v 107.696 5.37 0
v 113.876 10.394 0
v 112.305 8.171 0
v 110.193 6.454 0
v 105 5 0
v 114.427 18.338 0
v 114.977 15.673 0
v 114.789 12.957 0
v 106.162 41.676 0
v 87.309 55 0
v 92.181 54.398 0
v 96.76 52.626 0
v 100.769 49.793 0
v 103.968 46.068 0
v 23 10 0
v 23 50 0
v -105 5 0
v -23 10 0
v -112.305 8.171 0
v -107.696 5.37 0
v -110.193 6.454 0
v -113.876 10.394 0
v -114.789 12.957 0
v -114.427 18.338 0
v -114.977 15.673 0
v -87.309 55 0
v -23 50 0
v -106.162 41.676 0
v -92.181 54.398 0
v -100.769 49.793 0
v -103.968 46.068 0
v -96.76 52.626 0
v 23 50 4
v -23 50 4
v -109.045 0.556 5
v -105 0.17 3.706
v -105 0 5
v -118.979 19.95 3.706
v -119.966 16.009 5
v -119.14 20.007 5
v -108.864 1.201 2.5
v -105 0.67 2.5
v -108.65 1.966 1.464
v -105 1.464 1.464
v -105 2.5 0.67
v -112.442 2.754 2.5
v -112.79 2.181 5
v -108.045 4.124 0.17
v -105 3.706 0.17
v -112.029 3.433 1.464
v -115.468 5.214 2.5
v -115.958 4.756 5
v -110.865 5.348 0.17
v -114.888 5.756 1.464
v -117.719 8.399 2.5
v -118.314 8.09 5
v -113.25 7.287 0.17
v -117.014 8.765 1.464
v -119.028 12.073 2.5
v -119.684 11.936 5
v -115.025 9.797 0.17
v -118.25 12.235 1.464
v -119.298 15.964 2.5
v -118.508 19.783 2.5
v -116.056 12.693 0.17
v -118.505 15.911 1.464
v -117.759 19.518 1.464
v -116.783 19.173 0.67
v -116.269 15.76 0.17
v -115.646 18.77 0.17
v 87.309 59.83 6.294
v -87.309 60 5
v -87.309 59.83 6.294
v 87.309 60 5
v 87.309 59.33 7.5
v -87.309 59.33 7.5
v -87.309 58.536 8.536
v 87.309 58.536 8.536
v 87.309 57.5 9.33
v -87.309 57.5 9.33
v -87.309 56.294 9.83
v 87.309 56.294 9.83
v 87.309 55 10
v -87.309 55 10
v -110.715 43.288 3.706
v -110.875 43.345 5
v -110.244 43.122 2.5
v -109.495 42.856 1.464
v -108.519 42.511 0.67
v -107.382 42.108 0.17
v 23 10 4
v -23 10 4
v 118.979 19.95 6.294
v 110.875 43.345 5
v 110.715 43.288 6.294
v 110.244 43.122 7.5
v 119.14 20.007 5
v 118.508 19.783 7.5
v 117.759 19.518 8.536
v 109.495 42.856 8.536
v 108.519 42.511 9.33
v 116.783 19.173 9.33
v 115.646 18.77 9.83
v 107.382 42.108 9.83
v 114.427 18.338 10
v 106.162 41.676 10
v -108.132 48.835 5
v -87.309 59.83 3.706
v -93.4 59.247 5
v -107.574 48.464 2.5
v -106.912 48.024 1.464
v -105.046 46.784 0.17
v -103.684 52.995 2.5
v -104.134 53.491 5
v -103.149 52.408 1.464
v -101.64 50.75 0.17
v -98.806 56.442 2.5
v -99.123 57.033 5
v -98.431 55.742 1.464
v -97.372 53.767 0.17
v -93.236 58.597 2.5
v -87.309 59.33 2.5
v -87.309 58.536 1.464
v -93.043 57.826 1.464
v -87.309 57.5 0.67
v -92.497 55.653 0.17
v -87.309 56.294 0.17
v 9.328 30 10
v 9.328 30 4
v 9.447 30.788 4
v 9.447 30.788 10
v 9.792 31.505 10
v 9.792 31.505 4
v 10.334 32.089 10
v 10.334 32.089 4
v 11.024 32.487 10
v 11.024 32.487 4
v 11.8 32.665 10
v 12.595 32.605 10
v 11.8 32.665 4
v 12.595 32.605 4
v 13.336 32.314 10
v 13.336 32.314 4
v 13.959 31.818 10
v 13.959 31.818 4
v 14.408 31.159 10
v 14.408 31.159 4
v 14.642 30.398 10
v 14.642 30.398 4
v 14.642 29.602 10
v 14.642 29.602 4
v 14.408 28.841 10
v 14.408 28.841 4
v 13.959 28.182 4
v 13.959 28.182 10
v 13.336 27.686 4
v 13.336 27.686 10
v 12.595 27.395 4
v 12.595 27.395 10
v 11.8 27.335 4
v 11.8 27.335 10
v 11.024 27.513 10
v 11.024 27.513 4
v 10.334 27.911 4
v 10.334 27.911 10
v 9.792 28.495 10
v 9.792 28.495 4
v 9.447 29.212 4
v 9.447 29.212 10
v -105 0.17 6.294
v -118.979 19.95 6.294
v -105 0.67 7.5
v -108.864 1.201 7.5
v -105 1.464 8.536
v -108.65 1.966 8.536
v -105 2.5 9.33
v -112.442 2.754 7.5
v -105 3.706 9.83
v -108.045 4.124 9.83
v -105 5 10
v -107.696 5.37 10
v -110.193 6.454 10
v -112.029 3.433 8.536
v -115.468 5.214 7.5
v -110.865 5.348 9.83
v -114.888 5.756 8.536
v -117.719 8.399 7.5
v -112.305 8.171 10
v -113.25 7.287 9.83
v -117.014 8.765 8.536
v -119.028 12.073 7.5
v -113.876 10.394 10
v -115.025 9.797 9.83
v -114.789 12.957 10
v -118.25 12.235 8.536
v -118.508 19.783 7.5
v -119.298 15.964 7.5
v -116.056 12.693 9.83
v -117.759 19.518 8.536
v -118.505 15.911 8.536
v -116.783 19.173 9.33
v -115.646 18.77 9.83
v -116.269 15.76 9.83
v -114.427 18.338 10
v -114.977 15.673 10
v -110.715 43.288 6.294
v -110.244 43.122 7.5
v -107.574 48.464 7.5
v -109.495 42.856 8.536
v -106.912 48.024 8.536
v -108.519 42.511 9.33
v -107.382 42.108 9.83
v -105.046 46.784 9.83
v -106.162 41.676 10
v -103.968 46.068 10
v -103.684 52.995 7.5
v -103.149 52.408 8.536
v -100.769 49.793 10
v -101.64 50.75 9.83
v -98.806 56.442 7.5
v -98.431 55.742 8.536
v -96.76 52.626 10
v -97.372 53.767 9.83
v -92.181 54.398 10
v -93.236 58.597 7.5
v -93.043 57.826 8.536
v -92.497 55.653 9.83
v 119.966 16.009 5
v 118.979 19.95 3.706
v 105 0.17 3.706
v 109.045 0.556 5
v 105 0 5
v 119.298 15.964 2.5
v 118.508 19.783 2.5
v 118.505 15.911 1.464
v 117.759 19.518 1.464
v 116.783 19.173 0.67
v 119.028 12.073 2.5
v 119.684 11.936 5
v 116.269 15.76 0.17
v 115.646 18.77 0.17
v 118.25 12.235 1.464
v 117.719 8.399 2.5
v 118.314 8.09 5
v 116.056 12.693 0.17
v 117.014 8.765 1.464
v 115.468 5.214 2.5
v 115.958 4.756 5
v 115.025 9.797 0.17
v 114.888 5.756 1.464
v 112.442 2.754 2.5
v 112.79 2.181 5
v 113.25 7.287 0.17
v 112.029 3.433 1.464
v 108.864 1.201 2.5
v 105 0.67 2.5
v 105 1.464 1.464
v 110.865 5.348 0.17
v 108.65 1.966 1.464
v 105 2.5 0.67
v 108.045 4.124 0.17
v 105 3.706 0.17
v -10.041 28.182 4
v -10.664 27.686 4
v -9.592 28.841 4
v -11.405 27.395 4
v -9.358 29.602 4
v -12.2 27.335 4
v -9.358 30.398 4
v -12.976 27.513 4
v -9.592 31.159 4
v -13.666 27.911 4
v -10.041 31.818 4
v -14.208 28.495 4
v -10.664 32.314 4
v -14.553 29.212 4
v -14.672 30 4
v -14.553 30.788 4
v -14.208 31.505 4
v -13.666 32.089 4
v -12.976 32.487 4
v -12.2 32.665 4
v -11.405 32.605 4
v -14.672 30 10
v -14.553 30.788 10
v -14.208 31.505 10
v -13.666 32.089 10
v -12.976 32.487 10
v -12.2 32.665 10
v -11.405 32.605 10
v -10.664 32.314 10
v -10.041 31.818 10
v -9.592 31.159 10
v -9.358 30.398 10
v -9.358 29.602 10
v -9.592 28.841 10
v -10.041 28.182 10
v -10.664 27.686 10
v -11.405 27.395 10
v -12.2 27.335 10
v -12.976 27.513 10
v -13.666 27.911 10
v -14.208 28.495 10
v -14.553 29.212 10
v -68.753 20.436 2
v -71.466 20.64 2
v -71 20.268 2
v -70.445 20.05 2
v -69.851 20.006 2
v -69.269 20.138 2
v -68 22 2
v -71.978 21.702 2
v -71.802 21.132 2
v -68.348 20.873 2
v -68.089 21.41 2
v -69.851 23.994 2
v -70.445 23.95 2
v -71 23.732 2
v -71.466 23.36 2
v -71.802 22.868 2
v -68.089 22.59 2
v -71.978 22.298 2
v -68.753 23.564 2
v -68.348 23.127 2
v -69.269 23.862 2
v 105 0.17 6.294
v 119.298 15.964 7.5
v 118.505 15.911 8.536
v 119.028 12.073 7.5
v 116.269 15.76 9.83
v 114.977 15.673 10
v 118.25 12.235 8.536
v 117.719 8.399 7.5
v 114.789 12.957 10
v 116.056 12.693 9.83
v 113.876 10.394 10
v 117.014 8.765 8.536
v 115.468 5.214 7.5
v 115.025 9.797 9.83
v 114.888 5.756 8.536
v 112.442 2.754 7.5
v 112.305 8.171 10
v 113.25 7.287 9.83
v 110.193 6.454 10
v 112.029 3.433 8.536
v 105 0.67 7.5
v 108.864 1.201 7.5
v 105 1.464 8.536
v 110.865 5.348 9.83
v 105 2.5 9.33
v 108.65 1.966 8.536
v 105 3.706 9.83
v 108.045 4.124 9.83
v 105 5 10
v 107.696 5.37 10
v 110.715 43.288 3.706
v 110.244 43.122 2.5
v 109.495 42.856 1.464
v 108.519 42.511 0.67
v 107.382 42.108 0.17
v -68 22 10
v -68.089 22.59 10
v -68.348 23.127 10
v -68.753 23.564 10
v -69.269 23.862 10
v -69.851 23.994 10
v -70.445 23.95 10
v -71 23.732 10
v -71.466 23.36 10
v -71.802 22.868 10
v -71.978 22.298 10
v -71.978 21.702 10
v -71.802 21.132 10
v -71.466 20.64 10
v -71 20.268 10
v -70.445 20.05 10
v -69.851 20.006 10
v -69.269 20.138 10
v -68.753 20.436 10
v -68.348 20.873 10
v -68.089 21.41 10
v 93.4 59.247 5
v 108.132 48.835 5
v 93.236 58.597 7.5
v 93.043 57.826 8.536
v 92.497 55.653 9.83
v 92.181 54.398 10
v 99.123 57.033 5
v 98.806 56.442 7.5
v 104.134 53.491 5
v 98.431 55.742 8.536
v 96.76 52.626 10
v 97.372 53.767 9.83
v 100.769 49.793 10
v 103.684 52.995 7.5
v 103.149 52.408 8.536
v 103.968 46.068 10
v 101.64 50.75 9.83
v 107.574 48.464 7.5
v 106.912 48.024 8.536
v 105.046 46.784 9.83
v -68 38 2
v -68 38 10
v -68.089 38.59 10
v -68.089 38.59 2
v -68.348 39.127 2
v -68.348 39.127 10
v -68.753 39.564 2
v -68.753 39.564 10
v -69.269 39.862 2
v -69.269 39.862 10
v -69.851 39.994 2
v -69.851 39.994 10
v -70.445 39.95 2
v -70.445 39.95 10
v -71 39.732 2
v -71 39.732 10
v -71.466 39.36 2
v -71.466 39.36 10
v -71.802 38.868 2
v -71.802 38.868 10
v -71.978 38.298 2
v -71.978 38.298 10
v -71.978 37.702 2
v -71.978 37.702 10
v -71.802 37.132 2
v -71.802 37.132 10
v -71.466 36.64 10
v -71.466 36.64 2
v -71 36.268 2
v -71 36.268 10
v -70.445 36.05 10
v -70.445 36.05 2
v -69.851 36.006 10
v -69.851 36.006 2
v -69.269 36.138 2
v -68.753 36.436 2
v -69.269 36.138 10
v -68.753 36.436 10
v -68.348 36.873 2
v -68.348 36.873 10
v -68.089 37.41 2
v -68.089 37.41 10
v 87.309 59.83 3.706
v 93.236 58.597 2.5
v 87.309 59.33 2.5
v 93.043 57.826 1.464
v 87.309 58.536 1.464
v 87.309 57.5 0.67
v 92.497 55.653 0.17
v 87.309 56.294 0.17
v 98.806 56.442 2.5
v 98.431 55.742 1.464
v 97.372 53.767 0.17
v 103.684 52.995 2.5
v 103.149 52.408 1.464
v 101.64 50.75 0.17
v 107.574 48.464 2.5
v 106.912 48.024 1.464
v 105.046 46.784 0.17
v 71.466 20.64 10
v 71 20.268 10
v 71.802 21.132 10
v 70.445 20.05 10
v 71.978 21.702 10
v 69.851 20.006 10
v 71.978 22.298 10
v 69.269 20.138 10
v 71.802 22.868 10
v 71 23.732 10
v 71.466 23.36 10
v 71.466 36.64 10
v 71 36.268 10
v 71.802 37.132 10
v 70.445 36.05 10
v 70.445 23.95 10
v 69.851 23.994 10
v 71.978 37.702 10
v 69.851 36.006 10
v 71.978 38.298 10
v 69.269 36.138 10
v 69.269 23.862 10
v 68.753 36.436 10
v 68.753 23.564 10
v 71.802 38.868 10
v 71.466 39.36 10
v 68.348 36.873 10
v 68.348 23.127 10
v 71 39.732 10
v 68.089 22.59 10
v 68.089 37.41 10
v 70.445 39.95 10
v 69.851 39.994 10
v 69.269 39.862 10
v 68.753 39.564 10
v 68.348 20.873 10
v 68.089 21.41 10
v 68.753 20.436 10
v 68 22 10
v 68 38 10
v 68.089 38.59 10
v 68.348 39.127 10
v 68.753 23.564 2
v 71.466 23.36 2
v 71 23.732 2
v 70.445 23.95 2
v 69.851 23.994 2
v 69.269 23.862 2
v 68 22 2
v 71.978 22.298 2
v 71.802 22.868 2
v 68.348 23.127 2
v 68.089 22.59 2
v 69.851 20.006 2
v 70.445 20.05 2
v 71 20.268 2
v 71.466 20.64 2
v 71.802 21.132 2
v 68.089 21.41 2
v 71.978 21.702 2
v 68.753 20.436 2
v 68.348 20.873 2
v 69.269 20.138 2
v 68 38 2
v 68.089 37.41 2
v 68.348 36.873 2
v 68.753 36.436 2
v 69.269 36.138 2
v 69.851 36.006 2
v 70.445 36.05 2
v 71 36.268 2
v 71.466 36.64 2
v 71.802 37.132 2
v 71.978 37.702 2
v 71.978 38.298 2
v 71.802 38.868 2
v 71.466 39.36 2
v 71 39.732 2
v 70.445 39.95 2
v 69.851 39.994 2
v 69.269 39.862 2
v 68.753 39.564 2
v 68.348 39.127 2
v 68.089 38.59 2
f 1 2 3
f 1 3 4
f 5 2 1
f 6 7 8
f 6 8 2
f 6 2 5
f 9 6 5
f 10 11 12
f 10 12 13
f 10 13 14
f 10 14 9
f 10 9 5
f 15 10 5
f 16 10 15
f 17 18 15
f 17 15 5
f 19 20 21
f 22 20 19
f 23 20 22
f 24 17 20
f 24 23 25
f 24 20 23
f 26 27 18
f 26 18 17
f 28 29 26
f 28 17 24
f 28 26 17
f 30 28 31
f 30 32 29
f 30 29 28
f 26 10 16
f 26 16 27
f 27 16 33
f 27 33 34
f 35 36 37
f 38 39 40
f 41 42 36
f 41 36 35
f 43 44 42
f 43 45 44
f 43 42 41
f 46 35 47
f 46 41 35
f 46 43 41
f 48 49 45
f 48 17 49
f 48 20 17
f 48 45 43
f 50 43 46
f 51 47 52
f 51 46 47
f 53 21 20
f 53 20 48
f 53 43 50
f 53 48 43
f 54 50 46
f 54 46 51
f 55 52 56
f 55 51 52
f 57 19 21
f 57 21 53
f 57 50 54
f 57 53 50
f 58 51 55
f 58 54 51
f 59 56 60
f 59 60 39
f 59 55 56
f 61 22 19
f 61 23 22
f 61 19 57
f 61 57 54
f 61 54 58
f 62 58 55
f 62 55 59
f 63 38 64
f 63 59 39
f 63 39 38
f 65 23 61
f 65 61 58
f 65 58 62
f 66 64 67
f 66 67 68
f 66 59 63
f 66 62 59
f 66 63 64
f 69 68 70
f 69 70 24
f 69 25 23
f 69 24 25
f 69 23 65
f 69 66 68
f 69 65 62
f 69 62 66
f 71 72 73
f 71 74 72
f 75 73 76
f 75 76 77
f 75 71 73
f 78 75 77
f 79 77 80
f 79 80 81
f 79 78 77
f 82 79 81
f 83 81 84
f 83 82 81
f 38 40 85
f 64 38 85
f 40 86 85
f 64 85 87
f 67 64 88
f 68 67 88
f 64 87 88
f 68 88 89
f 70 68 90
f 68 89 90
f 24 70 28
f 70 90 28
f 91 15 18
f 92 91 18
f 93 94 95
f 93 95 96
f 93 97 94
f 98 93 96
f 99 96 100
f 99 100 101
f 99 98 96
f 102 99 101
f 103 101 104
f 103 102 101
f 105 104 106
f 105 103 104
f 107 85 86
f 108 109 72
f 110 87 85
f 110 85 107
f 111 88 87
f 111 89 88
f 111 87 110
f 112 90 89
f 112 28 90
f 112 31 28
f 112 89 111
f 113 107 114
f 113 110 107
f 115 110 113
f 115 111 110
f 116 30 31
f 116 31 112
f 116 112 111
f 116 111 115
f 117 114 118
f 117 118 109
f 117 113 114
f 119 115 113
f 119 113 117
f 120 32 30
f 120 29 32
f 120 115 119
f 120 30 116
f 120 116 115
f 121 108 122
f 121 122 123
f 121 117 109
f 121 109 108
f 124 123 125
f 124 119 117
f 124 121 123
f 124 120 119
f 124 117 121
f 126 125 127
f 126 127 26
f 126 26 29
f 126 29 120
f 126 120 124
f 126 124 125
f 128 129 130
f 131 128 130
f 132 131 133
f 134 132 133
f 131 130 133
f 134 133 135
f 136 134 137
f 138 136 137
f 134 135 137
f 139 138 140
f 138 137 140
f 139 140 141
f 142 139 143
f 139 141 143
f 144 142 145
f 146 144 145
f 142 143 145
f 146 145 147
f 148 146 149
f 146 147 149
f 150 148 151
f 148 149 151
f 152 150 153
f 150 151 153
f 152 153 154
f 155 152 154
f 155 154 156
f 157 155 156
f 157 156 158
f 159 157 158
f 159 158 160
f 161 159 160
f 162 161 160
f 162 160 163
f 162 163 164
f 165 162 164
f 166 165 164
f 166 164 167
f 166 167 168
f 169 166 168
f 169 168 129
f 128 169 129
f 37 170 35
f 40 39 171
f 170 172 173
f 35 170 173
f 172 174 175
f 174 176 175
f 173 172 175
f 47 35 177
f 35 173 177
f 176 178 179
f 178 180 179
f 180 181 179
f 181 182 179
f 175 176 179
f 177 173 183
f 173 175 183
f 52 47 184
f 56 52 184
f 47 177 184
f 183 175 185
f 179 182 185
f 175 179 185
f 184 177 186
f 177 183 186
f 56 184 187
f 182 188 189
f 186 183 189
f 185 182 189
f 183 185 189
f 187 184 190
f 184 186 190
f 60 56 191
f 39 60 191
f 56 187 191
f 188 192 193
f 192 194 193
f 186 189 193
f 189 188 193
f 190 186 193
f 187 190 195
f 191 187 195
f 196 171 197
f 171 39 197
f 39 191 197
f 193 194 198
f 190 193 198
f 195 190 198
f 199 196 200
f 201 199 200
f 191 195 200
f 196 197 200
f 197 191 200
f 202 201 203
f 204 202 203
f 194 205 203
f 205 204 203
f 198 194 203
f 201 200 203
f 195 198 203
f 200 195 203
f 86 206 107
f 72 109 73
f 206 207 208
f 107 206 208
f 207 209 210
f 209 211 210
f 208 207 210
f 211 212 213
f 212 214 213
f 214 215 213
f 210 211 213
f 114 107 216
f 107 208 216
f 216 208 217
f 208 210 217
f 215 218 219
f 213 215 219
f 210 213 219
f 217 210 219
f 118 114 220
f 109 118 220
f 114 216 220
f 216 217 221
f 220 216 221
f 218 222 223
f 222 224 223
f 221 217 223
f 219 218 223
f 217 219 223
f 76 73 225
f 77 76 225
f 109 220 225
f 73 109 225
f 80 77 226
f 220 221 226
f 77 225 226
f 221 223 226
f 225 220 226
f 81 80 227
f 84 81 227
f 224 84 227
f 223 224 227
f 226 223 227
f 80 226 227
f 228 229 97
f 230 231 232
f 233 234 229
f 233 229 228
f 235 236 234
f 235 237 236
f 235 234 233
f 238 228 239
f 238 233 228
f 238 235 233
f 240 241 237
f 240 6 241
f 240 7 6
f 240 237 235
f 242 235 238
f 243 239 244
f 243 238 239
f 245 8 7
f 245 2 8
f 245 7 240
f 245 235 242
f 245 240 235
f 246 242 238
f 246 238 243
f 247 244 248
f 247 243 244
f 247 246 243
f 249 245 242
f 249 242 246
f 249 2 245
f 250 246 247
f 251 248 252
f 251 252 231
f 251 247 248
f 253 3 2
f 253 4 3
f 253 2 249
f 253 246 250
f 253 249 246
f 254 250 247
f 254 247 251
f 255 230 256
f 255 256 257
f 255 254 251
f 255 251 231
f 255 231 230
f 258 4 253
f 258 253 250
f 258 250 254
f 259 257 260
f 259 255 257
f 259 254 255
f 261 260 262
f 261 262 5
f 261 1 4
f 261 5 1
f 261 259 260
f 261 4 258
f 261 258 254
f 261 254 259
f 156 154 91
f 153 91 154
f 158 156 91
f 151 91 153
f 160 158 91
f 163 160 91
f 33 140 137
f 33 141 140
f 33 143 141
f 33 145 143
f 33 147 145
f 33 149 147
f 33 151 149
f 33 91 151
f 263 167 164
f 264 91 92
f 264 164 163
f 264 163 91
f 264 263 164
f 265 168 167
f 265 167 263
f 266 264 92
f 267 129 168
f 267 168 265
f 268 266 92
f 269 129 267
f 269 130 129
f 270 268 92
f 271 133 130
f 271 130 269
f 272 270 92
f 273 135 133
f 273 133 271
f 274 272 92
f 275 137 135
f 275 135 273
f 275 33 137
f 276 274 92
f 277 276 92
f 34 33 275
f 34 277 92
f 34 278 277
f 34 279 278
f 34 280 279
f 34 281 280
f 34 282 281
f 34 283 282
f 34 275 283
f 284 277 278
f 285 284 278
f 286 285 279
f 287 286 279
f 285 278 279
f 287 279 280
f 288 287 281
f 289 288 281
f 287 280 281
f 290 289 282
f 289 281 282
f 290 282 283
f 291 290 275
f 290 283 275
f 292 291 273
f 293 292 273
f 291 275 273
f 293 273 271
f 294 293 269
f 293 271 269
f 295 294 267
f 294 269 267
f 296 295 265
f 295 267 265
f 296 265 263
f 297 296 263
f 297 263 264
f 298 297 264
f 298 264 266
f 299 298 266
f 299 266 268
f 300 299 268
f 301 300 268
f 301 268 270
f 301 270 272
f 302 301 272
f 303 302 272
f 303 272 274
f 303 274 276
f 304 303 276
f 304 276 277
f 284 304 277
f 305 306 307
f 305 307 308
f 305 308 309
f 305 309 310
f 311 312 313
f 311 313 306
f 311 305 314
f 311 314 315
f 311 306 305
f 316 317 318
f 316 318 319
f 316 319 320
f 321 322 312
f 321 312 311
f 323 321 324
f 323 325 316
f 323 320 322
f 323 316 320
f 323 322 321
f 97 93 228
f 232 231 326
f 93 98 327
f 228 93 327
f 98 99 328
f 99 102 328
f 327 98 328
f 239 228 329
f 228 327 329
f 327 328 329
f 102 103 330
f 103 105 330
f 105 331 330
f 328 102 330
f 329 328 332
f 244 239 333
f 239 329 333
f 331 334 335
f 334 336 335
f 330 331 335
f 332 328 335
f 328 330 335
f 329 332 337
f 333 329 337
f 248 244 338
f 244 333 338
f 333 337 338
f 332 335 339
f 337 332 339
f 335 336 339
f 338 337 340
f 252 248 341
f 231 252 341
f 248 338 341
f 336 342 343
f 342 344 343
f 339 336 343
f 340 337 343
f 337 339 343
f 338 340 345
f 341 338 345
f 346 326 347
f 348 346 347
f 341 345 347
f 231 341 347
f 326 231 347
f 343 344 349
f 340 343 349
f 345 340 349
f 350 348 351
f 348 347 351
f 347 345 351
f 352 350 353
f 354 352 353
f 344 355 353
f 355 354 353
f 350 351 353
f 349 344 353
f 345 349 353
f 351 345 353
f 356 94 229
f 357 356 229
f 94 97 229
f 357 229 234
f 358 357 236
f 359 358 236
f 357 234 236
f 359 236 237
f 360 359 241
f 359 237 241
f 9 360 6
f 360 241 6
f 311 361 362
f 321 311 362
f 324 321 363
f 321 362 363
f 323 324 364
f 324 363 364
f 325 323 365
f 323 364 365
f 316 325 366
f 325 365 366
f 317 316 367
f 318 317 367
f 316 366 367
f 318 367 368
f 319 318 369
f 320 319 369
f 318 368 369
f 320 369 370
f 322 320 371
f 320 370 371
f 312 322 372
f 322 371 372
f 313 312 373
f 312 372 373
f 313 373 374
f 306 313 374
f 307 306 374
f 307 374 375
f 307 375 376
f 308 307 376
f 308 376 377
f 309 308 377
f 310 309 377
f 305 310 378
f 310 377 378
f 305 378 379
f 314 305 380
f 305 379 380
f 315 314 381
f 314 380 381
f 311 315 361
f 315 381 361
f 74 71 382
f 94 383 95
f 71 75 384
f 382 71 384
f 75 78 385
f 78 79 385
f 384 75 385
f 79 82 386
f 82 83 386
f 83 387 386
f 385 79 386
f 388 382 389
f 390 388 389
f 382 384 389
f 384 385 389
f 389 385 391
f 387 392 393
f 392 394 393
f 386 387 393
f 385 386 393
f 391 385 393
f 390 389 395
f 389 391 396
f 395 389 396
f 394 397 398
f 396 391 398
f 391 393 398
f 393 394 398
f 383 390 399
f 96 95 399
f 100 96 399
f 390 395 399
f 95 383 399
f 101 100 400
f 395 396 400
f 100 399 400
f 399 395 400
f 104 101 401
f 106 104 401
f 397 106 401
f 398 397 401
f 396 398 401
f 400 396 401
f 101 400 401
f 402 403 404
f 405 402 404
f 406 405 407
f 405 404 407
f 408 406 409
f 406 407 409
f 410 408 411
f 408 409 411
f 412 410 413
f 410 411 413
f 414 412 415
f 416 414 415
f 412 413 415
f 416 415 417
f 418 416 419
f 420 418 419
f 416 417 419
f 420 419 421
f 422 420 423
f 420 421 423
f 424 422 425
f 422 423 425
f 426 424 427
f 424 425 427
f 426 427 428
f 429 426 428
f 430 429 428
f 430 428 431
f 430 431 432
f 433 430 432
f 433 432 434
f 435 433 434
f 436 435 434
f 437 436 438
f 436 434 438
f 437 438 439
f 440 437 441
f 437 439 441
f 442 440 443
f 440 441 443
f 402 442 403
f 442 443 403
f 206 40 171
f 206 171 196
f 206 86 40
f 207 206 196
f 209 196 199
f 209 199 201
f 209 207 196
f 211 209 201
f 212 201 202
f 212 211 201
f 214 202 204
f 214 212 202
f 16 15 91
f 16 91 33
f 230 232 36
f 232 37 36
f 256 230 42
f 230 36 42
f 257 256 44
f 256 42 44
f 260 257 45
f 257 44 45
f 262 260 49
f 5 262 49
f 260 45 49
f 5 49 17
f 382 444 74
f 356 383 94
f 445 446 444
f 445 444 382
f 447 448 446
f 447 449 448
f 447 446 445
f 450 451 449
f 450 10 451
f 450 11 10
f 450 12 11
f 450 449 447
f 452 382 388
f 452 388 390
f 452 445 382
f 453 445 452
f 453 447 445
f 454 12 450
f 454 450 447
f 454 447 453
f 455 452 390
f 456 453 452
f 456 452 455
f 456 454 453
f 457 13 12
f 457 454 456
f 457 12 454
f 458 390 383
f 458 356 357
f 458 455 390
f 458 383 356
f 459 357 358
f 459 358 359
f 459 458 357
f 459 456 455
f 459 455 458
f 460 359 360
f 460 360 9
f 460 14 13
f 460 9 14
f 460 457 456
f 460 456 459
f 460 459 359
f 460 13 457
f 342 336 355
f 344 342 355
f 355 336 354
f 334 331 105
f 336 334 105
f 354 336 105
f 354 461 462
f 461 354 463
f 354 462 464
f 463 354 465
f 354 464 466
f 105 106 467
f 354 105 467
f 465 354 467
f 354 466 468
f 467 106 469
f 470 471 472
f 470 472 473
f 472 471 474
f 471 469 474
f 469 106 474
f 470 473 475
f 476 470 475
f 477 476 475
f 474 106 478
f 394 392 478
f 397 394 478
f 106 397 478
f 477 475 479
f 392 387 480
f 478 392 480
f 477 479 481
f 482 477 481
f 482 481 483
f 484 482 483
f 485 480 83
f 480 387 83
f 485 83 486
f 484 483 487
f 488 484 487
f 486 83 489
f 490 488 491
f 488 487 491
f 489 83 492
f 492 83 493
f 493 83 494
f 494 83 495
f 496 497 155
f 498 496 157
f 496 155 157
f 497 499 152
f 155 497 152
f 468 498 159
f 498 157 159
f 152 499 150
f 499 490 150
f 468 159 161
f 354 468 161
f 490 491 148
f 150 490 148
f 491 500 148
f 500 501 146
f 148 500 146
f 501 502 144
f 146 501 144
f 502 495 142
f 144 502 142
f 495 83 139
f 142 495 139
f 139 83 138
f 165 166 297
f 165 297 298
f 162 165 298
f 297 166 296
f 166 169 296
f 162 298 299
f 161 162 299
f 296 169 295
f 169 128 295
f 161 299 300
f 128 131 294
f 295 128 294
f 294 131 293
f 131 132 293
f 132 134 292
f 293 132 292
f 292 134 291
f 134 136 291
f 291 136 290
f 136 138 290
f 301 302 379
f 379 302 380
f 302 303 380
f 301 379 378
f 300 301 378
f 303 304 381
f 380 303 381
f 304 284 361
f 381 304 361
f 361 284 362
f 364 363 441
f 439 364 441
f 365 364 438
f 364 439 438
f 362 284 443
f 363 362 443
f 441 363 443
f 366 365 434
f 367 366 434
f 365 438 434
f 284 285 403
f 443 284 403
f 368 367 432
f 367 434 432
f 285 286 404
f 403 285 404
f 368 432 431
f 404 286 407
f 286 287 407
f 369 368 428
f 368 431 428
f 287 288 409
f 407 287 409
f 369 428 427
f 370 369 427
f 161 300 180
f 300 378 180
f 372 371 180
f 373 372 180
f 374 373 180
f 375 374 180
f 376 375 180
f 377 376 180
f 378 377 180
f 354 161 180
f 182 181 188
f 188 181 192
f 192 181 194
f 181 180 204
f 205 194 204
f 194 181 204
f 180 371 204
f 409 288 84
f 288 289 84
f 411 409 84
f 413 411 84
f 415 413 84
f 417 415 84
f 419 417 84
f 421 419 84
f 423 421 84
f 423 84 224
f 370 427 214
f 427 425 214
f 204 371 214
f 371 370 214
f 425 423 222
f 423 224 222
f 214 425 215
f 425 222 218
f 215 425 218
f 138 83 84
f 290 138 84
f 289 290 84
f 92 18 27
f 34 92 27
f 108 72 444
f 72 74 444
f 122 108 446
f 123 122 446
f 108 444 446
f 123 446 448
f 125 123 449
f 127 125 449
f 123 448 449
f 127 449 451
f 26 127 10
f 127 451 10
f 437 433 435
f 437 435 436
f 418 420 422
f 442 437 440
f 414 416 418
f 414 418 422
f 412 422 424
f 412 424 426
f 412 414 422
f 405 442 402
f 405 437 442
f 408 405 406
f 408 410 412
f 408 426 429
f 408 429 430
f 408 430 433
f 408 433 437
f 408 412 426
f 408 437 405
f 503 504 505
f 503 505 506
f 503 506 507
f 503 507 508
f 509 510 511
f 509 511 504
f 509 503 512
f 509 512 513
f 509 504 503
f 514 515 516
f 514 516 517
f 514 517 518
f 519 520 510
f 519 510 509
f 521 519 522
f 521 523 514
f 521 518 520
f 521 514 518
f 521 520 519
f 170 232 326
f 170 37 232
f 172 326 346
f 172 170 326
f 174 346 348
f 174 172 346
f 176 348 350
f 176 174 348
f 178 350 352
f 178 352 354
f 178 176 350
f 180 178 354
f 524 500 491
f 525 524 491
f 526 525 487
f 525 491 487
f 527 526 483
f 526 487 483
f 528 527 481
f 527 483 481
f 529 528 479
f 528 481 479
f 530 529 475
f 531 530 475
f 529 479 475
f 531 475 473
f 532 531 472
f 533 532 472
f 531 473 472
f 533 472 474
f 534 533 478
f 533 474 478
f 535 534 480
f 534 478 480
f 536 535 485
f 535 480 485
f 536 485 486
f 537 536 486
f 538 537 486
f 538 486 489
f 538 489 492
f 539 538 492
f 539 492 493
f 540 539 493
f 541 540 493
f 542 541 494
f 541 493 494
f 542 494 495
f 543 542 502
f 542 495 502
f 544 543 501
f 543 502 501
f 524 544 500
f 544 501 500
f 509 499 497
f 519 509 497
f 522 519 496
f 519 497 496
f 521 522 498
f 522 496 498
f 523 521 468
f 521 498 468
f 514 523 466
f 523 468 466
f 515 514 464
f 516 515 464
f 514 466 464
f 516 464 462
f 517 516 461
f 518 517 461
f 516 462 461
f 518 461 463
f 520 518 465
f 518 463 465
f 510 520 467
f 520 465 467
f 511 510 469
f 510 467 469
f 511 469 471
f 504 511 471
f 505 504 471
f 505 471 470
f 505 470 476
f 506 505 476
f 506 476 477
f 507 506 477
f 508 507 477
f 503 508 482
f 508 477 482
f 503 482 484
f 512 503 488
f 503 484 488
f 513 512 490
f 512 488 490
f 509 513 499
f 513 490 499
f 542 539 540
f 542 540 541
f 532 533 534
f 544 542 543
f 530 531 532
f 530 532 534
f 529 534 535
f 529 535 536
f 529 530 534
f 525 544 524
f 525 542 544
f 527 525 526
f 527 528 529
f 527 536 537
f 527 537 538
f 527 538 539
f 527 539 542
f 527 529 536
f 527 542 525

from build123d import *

# Parameters (mm, degrees)
BOSS_EXTRUDE1_DEPTH = 10
SKETCH2_R           = 2
CUT_EXTRUDE1_DEPTH  = 8
FILLET1_R           = 5
SKETCH3_W           = 46
SKETCH3_H           = 40
CUT_EXTRUDE2_DEPTH  = 4
SKETCH4_R           = 2.672212582
CUT_EXTRUDE3_DEPTH  = 135.298175803


with BuildPart() as part:
    # Sketch1 → Boss-Extrude1 (new body)
    with BuildSketch(Plane.XY):
        with BuildLine():
            Line((0, 0), (-105, 0))
            ThreePointArc((-105, 0), (-117.249623327, 6.342822149), (-119.139622366, 20.007102889))
            Line((-119.139622366, 20.007102889), (-110.875178831, 43.345171481))
            ThreePointArc((-110.875178831, 43.345171481), (-101.737771304, 55.416038879), (-87.309141554, 60))
            Line((-87.309141554, 60), (87.309141554, 60))
            ThreePointArc((87.309141554, 60), (101.737771304, 55.416038879), (110.875178831, 43.345171481))
            Line((110.875178831, 43.345171481), (119.139622366, 20.007102889))
            ThreePointArc((119.139622366, 20.007102889), (117.249623327, 6.342822149), (105, 0))
            Line((105, 0), (0, 0))
        make_face()
    extrude(amount=BOSS_EXTRUDE1_DEPTH)

    # Sketch2 → Cut-Extrude1 (cut)
    with BuildSketch(Plane.XY.offset(10)):
        with Locations((-70, 22)):
            Circle(SKETCH2_R)
        with Locations((-70, 38)):
            Circle(SKETCH2_R)
        with Locations(Location((70, 22, 0), (0, 0, 180))):
            Circle(SKETCH2_R)
        with Locations(Location((70, 38, 0), (0, 0, 180))):
            Circle(SKETCH2_R)
    extrude(amount=-CUT_EXTRUDE1_DEPTH, mode=Mode.SUBTRACT)

    # Fillet1
    fillet1_edges = [part.edges().sort_by_distance(p)[0] for p in [
        (-117.249623327, 6.342822149, 0),
        (-115.007400599, 31.676137185, 0),
        (-101.737771304, 55.416038879, 0),
        (0, 60, 0),
        (101.737771304, 55.416038879, 0),
        (115.007400599, 31.676137185, 0),
        (117.249623327, 6.342822149, 0),
        (-117.249623327, 6.342822149, 10),
        (-115.007400599, 31.676137185, 10),
        (-101.737771304, 55.416038879, 10),
        (0, 60, 10),
        (101.737771304, 55.416038879, 10),
        (115.007400599, 31.676137185, 10),
        (117.249623327, 6.342822149, 10),
        (0, 0, 0),
        (0, 0, 10),
    ]]
    fillet(fillet1_edges, radius=FILLET1_R - 0.0001)  # a hair under: the kernel refuses the full size

    # Sketch3 → Cut-Extrude2 (cut)
    with BuildSketch(Plane(origin=(0, 0, 0), x_dir=(-1, 0, 0), z_dir=(0, 0, -1))):
        with Locations((0, 30)):
            Rectangle(SKETCH3_W, SKETCH3_H)
    extrude(amount=-CUT_EXTRUDE2_DEPTH, mode=Mode.SUBTRACT)

    # Sketch4 → Cut-Extrude3 (cut, through all)
    with BuildSketch(Plane(origin=(0, 0, 4), x_dir=(-1, 0, 0), z_dir=(0, 0, -1))):
        with Locations((-12, 30)):
            Circle(SKETCH4_R)
        with Locations((12, 30)):
            Circle(SKETCH4_R)
    extrude(amount=-CUT_EXTRUDE3_DEPTH, mode=Mode.SUBTRACT)


solid = part.part
